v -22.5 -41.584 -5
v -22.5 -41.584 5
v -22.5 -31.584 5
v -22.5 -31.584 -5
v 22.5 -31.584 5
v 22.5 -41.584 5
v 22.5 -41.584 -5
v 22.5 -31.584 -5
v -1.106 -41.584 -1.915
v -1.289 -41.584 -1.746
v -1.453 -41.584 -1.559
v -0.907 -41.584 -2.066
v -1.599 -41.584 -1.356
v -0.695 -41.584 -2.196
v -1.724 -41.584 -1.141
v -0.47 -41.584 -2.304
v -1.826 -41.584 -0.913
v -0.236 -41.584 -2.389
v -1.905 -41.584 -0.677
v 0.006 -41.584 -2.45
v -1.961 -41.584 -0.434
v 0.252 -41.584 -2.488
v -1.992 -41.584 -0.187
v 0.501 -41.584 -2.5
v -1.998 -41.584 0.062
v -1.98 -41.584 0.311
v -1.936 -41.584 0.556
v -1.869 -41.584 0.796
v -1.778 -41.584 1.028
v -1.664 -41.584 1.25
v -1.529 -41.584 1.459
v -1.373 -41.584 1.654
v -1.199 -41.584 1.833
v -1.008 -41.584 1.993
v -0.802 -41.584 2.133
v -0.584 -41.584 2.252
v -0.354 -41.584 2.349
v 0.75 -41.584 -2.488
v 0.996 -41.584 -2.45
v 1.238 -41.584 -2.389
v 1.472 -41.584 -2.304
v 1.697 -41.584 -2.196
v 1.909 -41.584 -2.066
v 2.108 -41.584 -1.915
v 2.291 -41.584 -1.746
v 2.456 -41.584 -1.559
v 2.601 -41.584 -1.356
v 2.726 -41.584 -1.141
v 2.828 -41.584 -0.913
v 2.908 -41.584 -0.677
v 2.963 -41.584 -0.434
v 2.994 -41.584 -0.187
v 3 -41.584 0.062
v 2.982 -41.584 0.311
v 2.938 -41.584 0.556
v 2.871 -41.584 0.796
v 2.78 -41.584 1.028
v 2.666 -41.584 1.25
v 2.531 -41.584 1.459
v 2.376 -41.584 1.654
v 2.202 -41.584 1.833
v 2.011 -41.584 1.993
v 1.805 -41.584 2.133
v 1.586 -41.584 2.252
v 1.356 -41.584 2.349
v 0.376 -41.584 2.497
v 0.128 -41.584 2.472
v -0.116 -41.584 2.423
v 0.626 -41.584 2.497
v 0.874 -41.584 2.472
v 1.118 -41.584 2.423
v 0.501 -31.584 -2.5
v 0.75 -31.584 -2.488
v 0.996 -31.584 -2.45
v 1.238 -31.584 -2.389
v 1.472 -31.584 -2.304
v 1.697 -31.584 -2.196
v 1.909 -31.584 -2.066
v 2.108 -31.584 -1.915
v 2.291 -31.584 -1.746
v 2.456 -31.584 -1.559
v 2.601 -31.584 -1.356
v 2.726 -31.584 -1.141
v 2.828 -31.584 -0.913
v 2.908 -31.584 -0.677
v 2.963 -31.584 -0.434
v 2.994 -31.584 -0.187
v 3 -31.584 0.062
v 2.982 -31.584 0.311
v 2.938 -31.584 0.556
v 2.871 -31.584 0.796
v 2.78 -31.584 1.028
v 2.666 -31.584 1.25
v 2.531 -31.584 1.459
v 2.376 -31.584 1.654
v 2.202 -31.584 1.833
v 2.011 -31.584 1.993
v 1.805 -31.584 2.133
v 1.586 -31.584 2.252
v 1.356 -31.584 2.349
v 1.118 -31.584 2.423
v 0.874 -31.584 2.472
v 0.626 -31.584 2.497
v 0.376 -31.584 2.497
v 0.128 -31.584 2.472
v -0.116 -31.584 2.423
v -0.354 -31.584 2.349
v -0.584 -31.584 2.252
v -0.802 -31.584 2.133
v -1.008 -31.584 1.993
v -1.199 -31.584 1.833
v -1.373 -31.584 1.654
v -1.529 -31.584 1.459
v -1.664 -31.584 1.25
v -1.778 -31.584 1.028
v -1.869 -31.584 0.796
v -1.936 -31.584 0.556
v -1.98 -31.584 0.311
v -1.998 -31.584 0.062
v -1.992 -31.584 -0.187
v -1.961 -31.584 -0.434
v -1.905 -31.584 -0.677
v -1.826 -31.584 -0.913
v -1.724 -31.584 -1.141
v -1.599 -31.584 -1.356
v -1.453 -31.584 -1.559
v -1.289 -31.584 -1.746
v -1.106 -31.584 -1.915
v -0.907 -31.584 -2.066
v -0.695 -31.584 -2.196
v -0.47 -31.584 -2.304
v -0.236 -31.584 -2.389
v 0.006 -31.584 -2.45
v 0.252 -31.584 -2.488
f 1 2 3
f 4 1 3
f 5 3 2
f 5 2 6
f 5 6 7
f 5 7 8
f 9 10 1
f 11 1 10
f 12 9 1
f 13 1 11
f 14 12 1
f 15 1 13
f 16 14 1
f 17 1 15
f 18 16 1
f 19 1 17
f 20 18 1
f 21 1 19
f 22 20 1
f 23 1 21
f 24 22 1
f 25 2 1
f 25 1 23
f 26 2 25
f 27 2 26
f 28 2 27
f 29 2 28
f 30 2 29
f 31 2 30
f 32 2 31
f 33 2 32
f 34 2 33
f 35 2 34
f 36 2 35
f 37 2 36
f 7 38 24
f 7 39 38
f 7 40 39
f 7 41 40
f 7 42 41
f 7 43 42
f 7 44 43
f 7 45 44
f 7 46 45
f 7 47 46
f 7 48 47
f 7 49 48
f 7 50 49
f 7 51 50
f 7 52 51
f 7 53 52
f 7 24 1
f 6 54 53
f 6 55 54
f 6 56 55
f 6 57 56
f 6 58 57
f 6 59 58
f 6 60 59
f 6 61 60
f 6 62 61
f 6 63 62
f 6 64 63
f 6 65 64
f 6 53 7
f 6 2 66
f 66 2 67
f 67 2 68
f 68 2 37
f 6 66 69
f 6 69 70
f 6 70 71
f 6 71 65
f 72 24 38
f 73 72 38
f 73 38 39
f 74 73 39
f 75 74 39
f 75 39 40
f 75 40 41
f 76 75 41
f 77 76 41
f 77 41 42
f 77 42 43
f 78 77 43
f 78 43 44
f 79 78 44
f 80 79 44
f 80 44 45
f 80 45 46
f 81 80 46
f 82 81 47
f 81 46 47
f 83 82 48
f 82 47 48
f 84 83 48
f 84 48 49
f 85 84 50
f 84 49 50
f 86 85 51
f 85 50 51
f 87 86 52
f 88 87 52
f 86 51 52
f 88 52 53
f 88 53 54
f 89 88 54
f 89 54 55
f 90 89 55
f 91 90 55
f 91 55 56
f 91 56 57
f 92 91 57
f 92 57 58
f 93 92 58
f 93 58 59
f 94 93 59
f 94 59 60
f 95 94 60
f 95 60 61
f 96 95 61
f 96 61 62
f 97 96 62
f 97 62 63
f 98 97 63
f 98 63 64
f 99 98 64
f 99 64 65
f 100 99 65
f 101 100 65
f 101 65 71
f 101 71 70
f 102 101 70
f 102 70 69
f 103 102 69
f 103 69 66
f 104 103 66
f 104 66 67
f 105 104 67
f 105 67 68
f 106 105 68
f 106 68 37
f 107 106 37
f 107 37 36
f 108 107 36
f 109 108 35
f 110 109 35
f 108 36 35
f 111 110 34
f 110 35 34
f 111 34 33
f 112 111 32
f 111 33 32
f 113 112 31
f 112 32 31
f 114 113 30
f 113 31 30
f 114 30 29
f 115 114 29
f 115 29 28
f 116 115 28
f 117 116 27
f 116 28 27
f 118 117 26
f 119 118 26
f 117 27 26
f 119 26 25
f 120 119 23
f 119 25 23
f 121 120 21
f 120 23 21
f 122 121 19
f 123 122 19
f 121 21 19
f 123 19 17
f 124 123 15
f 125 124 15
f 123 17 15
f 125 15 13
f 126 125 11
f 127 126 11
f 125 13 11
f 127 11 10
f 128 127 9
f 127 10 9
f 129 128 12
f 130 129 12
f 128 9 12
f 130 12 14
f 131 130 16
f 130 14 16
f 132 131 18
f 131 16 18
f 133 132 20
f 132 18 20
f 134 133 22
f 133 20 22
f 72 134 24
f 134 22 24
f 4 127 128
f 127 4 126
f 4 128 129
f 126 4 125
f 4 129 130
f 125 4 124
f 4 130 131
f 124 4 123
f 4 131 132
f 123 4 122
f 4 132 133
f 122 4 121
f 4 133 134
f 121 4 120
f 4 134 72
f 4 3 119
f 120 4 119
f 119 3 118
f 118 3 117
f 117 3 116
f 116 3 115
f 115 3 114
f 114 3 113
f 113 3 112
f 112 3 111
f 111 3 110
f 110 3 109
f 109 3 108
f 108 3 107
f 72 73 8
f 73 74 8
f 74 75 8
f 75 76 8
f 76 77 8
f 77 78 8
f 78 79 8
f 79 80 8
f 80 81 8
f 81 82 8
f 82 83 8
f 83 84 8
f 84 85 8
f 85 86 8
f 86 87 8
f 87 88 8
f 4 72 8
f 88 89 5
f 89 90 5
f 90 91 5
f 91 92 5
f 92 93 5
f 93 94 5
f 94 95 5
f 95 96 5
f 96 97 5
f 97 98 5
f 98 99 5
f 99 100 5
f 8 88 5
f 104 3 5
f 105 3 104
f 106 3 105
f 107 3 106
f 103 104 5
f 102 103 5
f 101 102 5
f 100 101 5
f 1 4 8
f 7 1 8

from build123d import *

# Parameters (mm, degrees)
SCHIZZO1_W                   = 45
SCHIZZO1_H                   = 10
ESTRUSIONE_ESTRUSIONE1_DEPTH = 5
SCHIZZO2_R                   = 2.5
TAGLIO_ESTRUSIONE1_DEPTH     = 26.124689053


with BuildPart() as part:
    # Schizzo1 → Estrusione-Estrusione1 (new, symmetric)
    with BuildSketch(Plane.XY):
        with Locations((0, -36.584144653)):
            Rectangle(SCHIZZO1_W, SCHIZZO1_H)
    extrude(amount=ESTRUSIONE_ESTRUSIONE1_DEPTH, both=True)

    # Schizzo2 → Taglio-Estrusione1 (cut, through all)
    with BuildSketch(Plane.XZ.offset(41.584144653)):
        with Locations(Location((0.501094215, 0, 0), (0, 0, 270))):
            Circle(SCHIZZO2_R)
    extrude(amount=-TAGLIO_ESTRUSIONE1_DEPTH, mode=Mode.SUBTRACT)


solid = part.part
